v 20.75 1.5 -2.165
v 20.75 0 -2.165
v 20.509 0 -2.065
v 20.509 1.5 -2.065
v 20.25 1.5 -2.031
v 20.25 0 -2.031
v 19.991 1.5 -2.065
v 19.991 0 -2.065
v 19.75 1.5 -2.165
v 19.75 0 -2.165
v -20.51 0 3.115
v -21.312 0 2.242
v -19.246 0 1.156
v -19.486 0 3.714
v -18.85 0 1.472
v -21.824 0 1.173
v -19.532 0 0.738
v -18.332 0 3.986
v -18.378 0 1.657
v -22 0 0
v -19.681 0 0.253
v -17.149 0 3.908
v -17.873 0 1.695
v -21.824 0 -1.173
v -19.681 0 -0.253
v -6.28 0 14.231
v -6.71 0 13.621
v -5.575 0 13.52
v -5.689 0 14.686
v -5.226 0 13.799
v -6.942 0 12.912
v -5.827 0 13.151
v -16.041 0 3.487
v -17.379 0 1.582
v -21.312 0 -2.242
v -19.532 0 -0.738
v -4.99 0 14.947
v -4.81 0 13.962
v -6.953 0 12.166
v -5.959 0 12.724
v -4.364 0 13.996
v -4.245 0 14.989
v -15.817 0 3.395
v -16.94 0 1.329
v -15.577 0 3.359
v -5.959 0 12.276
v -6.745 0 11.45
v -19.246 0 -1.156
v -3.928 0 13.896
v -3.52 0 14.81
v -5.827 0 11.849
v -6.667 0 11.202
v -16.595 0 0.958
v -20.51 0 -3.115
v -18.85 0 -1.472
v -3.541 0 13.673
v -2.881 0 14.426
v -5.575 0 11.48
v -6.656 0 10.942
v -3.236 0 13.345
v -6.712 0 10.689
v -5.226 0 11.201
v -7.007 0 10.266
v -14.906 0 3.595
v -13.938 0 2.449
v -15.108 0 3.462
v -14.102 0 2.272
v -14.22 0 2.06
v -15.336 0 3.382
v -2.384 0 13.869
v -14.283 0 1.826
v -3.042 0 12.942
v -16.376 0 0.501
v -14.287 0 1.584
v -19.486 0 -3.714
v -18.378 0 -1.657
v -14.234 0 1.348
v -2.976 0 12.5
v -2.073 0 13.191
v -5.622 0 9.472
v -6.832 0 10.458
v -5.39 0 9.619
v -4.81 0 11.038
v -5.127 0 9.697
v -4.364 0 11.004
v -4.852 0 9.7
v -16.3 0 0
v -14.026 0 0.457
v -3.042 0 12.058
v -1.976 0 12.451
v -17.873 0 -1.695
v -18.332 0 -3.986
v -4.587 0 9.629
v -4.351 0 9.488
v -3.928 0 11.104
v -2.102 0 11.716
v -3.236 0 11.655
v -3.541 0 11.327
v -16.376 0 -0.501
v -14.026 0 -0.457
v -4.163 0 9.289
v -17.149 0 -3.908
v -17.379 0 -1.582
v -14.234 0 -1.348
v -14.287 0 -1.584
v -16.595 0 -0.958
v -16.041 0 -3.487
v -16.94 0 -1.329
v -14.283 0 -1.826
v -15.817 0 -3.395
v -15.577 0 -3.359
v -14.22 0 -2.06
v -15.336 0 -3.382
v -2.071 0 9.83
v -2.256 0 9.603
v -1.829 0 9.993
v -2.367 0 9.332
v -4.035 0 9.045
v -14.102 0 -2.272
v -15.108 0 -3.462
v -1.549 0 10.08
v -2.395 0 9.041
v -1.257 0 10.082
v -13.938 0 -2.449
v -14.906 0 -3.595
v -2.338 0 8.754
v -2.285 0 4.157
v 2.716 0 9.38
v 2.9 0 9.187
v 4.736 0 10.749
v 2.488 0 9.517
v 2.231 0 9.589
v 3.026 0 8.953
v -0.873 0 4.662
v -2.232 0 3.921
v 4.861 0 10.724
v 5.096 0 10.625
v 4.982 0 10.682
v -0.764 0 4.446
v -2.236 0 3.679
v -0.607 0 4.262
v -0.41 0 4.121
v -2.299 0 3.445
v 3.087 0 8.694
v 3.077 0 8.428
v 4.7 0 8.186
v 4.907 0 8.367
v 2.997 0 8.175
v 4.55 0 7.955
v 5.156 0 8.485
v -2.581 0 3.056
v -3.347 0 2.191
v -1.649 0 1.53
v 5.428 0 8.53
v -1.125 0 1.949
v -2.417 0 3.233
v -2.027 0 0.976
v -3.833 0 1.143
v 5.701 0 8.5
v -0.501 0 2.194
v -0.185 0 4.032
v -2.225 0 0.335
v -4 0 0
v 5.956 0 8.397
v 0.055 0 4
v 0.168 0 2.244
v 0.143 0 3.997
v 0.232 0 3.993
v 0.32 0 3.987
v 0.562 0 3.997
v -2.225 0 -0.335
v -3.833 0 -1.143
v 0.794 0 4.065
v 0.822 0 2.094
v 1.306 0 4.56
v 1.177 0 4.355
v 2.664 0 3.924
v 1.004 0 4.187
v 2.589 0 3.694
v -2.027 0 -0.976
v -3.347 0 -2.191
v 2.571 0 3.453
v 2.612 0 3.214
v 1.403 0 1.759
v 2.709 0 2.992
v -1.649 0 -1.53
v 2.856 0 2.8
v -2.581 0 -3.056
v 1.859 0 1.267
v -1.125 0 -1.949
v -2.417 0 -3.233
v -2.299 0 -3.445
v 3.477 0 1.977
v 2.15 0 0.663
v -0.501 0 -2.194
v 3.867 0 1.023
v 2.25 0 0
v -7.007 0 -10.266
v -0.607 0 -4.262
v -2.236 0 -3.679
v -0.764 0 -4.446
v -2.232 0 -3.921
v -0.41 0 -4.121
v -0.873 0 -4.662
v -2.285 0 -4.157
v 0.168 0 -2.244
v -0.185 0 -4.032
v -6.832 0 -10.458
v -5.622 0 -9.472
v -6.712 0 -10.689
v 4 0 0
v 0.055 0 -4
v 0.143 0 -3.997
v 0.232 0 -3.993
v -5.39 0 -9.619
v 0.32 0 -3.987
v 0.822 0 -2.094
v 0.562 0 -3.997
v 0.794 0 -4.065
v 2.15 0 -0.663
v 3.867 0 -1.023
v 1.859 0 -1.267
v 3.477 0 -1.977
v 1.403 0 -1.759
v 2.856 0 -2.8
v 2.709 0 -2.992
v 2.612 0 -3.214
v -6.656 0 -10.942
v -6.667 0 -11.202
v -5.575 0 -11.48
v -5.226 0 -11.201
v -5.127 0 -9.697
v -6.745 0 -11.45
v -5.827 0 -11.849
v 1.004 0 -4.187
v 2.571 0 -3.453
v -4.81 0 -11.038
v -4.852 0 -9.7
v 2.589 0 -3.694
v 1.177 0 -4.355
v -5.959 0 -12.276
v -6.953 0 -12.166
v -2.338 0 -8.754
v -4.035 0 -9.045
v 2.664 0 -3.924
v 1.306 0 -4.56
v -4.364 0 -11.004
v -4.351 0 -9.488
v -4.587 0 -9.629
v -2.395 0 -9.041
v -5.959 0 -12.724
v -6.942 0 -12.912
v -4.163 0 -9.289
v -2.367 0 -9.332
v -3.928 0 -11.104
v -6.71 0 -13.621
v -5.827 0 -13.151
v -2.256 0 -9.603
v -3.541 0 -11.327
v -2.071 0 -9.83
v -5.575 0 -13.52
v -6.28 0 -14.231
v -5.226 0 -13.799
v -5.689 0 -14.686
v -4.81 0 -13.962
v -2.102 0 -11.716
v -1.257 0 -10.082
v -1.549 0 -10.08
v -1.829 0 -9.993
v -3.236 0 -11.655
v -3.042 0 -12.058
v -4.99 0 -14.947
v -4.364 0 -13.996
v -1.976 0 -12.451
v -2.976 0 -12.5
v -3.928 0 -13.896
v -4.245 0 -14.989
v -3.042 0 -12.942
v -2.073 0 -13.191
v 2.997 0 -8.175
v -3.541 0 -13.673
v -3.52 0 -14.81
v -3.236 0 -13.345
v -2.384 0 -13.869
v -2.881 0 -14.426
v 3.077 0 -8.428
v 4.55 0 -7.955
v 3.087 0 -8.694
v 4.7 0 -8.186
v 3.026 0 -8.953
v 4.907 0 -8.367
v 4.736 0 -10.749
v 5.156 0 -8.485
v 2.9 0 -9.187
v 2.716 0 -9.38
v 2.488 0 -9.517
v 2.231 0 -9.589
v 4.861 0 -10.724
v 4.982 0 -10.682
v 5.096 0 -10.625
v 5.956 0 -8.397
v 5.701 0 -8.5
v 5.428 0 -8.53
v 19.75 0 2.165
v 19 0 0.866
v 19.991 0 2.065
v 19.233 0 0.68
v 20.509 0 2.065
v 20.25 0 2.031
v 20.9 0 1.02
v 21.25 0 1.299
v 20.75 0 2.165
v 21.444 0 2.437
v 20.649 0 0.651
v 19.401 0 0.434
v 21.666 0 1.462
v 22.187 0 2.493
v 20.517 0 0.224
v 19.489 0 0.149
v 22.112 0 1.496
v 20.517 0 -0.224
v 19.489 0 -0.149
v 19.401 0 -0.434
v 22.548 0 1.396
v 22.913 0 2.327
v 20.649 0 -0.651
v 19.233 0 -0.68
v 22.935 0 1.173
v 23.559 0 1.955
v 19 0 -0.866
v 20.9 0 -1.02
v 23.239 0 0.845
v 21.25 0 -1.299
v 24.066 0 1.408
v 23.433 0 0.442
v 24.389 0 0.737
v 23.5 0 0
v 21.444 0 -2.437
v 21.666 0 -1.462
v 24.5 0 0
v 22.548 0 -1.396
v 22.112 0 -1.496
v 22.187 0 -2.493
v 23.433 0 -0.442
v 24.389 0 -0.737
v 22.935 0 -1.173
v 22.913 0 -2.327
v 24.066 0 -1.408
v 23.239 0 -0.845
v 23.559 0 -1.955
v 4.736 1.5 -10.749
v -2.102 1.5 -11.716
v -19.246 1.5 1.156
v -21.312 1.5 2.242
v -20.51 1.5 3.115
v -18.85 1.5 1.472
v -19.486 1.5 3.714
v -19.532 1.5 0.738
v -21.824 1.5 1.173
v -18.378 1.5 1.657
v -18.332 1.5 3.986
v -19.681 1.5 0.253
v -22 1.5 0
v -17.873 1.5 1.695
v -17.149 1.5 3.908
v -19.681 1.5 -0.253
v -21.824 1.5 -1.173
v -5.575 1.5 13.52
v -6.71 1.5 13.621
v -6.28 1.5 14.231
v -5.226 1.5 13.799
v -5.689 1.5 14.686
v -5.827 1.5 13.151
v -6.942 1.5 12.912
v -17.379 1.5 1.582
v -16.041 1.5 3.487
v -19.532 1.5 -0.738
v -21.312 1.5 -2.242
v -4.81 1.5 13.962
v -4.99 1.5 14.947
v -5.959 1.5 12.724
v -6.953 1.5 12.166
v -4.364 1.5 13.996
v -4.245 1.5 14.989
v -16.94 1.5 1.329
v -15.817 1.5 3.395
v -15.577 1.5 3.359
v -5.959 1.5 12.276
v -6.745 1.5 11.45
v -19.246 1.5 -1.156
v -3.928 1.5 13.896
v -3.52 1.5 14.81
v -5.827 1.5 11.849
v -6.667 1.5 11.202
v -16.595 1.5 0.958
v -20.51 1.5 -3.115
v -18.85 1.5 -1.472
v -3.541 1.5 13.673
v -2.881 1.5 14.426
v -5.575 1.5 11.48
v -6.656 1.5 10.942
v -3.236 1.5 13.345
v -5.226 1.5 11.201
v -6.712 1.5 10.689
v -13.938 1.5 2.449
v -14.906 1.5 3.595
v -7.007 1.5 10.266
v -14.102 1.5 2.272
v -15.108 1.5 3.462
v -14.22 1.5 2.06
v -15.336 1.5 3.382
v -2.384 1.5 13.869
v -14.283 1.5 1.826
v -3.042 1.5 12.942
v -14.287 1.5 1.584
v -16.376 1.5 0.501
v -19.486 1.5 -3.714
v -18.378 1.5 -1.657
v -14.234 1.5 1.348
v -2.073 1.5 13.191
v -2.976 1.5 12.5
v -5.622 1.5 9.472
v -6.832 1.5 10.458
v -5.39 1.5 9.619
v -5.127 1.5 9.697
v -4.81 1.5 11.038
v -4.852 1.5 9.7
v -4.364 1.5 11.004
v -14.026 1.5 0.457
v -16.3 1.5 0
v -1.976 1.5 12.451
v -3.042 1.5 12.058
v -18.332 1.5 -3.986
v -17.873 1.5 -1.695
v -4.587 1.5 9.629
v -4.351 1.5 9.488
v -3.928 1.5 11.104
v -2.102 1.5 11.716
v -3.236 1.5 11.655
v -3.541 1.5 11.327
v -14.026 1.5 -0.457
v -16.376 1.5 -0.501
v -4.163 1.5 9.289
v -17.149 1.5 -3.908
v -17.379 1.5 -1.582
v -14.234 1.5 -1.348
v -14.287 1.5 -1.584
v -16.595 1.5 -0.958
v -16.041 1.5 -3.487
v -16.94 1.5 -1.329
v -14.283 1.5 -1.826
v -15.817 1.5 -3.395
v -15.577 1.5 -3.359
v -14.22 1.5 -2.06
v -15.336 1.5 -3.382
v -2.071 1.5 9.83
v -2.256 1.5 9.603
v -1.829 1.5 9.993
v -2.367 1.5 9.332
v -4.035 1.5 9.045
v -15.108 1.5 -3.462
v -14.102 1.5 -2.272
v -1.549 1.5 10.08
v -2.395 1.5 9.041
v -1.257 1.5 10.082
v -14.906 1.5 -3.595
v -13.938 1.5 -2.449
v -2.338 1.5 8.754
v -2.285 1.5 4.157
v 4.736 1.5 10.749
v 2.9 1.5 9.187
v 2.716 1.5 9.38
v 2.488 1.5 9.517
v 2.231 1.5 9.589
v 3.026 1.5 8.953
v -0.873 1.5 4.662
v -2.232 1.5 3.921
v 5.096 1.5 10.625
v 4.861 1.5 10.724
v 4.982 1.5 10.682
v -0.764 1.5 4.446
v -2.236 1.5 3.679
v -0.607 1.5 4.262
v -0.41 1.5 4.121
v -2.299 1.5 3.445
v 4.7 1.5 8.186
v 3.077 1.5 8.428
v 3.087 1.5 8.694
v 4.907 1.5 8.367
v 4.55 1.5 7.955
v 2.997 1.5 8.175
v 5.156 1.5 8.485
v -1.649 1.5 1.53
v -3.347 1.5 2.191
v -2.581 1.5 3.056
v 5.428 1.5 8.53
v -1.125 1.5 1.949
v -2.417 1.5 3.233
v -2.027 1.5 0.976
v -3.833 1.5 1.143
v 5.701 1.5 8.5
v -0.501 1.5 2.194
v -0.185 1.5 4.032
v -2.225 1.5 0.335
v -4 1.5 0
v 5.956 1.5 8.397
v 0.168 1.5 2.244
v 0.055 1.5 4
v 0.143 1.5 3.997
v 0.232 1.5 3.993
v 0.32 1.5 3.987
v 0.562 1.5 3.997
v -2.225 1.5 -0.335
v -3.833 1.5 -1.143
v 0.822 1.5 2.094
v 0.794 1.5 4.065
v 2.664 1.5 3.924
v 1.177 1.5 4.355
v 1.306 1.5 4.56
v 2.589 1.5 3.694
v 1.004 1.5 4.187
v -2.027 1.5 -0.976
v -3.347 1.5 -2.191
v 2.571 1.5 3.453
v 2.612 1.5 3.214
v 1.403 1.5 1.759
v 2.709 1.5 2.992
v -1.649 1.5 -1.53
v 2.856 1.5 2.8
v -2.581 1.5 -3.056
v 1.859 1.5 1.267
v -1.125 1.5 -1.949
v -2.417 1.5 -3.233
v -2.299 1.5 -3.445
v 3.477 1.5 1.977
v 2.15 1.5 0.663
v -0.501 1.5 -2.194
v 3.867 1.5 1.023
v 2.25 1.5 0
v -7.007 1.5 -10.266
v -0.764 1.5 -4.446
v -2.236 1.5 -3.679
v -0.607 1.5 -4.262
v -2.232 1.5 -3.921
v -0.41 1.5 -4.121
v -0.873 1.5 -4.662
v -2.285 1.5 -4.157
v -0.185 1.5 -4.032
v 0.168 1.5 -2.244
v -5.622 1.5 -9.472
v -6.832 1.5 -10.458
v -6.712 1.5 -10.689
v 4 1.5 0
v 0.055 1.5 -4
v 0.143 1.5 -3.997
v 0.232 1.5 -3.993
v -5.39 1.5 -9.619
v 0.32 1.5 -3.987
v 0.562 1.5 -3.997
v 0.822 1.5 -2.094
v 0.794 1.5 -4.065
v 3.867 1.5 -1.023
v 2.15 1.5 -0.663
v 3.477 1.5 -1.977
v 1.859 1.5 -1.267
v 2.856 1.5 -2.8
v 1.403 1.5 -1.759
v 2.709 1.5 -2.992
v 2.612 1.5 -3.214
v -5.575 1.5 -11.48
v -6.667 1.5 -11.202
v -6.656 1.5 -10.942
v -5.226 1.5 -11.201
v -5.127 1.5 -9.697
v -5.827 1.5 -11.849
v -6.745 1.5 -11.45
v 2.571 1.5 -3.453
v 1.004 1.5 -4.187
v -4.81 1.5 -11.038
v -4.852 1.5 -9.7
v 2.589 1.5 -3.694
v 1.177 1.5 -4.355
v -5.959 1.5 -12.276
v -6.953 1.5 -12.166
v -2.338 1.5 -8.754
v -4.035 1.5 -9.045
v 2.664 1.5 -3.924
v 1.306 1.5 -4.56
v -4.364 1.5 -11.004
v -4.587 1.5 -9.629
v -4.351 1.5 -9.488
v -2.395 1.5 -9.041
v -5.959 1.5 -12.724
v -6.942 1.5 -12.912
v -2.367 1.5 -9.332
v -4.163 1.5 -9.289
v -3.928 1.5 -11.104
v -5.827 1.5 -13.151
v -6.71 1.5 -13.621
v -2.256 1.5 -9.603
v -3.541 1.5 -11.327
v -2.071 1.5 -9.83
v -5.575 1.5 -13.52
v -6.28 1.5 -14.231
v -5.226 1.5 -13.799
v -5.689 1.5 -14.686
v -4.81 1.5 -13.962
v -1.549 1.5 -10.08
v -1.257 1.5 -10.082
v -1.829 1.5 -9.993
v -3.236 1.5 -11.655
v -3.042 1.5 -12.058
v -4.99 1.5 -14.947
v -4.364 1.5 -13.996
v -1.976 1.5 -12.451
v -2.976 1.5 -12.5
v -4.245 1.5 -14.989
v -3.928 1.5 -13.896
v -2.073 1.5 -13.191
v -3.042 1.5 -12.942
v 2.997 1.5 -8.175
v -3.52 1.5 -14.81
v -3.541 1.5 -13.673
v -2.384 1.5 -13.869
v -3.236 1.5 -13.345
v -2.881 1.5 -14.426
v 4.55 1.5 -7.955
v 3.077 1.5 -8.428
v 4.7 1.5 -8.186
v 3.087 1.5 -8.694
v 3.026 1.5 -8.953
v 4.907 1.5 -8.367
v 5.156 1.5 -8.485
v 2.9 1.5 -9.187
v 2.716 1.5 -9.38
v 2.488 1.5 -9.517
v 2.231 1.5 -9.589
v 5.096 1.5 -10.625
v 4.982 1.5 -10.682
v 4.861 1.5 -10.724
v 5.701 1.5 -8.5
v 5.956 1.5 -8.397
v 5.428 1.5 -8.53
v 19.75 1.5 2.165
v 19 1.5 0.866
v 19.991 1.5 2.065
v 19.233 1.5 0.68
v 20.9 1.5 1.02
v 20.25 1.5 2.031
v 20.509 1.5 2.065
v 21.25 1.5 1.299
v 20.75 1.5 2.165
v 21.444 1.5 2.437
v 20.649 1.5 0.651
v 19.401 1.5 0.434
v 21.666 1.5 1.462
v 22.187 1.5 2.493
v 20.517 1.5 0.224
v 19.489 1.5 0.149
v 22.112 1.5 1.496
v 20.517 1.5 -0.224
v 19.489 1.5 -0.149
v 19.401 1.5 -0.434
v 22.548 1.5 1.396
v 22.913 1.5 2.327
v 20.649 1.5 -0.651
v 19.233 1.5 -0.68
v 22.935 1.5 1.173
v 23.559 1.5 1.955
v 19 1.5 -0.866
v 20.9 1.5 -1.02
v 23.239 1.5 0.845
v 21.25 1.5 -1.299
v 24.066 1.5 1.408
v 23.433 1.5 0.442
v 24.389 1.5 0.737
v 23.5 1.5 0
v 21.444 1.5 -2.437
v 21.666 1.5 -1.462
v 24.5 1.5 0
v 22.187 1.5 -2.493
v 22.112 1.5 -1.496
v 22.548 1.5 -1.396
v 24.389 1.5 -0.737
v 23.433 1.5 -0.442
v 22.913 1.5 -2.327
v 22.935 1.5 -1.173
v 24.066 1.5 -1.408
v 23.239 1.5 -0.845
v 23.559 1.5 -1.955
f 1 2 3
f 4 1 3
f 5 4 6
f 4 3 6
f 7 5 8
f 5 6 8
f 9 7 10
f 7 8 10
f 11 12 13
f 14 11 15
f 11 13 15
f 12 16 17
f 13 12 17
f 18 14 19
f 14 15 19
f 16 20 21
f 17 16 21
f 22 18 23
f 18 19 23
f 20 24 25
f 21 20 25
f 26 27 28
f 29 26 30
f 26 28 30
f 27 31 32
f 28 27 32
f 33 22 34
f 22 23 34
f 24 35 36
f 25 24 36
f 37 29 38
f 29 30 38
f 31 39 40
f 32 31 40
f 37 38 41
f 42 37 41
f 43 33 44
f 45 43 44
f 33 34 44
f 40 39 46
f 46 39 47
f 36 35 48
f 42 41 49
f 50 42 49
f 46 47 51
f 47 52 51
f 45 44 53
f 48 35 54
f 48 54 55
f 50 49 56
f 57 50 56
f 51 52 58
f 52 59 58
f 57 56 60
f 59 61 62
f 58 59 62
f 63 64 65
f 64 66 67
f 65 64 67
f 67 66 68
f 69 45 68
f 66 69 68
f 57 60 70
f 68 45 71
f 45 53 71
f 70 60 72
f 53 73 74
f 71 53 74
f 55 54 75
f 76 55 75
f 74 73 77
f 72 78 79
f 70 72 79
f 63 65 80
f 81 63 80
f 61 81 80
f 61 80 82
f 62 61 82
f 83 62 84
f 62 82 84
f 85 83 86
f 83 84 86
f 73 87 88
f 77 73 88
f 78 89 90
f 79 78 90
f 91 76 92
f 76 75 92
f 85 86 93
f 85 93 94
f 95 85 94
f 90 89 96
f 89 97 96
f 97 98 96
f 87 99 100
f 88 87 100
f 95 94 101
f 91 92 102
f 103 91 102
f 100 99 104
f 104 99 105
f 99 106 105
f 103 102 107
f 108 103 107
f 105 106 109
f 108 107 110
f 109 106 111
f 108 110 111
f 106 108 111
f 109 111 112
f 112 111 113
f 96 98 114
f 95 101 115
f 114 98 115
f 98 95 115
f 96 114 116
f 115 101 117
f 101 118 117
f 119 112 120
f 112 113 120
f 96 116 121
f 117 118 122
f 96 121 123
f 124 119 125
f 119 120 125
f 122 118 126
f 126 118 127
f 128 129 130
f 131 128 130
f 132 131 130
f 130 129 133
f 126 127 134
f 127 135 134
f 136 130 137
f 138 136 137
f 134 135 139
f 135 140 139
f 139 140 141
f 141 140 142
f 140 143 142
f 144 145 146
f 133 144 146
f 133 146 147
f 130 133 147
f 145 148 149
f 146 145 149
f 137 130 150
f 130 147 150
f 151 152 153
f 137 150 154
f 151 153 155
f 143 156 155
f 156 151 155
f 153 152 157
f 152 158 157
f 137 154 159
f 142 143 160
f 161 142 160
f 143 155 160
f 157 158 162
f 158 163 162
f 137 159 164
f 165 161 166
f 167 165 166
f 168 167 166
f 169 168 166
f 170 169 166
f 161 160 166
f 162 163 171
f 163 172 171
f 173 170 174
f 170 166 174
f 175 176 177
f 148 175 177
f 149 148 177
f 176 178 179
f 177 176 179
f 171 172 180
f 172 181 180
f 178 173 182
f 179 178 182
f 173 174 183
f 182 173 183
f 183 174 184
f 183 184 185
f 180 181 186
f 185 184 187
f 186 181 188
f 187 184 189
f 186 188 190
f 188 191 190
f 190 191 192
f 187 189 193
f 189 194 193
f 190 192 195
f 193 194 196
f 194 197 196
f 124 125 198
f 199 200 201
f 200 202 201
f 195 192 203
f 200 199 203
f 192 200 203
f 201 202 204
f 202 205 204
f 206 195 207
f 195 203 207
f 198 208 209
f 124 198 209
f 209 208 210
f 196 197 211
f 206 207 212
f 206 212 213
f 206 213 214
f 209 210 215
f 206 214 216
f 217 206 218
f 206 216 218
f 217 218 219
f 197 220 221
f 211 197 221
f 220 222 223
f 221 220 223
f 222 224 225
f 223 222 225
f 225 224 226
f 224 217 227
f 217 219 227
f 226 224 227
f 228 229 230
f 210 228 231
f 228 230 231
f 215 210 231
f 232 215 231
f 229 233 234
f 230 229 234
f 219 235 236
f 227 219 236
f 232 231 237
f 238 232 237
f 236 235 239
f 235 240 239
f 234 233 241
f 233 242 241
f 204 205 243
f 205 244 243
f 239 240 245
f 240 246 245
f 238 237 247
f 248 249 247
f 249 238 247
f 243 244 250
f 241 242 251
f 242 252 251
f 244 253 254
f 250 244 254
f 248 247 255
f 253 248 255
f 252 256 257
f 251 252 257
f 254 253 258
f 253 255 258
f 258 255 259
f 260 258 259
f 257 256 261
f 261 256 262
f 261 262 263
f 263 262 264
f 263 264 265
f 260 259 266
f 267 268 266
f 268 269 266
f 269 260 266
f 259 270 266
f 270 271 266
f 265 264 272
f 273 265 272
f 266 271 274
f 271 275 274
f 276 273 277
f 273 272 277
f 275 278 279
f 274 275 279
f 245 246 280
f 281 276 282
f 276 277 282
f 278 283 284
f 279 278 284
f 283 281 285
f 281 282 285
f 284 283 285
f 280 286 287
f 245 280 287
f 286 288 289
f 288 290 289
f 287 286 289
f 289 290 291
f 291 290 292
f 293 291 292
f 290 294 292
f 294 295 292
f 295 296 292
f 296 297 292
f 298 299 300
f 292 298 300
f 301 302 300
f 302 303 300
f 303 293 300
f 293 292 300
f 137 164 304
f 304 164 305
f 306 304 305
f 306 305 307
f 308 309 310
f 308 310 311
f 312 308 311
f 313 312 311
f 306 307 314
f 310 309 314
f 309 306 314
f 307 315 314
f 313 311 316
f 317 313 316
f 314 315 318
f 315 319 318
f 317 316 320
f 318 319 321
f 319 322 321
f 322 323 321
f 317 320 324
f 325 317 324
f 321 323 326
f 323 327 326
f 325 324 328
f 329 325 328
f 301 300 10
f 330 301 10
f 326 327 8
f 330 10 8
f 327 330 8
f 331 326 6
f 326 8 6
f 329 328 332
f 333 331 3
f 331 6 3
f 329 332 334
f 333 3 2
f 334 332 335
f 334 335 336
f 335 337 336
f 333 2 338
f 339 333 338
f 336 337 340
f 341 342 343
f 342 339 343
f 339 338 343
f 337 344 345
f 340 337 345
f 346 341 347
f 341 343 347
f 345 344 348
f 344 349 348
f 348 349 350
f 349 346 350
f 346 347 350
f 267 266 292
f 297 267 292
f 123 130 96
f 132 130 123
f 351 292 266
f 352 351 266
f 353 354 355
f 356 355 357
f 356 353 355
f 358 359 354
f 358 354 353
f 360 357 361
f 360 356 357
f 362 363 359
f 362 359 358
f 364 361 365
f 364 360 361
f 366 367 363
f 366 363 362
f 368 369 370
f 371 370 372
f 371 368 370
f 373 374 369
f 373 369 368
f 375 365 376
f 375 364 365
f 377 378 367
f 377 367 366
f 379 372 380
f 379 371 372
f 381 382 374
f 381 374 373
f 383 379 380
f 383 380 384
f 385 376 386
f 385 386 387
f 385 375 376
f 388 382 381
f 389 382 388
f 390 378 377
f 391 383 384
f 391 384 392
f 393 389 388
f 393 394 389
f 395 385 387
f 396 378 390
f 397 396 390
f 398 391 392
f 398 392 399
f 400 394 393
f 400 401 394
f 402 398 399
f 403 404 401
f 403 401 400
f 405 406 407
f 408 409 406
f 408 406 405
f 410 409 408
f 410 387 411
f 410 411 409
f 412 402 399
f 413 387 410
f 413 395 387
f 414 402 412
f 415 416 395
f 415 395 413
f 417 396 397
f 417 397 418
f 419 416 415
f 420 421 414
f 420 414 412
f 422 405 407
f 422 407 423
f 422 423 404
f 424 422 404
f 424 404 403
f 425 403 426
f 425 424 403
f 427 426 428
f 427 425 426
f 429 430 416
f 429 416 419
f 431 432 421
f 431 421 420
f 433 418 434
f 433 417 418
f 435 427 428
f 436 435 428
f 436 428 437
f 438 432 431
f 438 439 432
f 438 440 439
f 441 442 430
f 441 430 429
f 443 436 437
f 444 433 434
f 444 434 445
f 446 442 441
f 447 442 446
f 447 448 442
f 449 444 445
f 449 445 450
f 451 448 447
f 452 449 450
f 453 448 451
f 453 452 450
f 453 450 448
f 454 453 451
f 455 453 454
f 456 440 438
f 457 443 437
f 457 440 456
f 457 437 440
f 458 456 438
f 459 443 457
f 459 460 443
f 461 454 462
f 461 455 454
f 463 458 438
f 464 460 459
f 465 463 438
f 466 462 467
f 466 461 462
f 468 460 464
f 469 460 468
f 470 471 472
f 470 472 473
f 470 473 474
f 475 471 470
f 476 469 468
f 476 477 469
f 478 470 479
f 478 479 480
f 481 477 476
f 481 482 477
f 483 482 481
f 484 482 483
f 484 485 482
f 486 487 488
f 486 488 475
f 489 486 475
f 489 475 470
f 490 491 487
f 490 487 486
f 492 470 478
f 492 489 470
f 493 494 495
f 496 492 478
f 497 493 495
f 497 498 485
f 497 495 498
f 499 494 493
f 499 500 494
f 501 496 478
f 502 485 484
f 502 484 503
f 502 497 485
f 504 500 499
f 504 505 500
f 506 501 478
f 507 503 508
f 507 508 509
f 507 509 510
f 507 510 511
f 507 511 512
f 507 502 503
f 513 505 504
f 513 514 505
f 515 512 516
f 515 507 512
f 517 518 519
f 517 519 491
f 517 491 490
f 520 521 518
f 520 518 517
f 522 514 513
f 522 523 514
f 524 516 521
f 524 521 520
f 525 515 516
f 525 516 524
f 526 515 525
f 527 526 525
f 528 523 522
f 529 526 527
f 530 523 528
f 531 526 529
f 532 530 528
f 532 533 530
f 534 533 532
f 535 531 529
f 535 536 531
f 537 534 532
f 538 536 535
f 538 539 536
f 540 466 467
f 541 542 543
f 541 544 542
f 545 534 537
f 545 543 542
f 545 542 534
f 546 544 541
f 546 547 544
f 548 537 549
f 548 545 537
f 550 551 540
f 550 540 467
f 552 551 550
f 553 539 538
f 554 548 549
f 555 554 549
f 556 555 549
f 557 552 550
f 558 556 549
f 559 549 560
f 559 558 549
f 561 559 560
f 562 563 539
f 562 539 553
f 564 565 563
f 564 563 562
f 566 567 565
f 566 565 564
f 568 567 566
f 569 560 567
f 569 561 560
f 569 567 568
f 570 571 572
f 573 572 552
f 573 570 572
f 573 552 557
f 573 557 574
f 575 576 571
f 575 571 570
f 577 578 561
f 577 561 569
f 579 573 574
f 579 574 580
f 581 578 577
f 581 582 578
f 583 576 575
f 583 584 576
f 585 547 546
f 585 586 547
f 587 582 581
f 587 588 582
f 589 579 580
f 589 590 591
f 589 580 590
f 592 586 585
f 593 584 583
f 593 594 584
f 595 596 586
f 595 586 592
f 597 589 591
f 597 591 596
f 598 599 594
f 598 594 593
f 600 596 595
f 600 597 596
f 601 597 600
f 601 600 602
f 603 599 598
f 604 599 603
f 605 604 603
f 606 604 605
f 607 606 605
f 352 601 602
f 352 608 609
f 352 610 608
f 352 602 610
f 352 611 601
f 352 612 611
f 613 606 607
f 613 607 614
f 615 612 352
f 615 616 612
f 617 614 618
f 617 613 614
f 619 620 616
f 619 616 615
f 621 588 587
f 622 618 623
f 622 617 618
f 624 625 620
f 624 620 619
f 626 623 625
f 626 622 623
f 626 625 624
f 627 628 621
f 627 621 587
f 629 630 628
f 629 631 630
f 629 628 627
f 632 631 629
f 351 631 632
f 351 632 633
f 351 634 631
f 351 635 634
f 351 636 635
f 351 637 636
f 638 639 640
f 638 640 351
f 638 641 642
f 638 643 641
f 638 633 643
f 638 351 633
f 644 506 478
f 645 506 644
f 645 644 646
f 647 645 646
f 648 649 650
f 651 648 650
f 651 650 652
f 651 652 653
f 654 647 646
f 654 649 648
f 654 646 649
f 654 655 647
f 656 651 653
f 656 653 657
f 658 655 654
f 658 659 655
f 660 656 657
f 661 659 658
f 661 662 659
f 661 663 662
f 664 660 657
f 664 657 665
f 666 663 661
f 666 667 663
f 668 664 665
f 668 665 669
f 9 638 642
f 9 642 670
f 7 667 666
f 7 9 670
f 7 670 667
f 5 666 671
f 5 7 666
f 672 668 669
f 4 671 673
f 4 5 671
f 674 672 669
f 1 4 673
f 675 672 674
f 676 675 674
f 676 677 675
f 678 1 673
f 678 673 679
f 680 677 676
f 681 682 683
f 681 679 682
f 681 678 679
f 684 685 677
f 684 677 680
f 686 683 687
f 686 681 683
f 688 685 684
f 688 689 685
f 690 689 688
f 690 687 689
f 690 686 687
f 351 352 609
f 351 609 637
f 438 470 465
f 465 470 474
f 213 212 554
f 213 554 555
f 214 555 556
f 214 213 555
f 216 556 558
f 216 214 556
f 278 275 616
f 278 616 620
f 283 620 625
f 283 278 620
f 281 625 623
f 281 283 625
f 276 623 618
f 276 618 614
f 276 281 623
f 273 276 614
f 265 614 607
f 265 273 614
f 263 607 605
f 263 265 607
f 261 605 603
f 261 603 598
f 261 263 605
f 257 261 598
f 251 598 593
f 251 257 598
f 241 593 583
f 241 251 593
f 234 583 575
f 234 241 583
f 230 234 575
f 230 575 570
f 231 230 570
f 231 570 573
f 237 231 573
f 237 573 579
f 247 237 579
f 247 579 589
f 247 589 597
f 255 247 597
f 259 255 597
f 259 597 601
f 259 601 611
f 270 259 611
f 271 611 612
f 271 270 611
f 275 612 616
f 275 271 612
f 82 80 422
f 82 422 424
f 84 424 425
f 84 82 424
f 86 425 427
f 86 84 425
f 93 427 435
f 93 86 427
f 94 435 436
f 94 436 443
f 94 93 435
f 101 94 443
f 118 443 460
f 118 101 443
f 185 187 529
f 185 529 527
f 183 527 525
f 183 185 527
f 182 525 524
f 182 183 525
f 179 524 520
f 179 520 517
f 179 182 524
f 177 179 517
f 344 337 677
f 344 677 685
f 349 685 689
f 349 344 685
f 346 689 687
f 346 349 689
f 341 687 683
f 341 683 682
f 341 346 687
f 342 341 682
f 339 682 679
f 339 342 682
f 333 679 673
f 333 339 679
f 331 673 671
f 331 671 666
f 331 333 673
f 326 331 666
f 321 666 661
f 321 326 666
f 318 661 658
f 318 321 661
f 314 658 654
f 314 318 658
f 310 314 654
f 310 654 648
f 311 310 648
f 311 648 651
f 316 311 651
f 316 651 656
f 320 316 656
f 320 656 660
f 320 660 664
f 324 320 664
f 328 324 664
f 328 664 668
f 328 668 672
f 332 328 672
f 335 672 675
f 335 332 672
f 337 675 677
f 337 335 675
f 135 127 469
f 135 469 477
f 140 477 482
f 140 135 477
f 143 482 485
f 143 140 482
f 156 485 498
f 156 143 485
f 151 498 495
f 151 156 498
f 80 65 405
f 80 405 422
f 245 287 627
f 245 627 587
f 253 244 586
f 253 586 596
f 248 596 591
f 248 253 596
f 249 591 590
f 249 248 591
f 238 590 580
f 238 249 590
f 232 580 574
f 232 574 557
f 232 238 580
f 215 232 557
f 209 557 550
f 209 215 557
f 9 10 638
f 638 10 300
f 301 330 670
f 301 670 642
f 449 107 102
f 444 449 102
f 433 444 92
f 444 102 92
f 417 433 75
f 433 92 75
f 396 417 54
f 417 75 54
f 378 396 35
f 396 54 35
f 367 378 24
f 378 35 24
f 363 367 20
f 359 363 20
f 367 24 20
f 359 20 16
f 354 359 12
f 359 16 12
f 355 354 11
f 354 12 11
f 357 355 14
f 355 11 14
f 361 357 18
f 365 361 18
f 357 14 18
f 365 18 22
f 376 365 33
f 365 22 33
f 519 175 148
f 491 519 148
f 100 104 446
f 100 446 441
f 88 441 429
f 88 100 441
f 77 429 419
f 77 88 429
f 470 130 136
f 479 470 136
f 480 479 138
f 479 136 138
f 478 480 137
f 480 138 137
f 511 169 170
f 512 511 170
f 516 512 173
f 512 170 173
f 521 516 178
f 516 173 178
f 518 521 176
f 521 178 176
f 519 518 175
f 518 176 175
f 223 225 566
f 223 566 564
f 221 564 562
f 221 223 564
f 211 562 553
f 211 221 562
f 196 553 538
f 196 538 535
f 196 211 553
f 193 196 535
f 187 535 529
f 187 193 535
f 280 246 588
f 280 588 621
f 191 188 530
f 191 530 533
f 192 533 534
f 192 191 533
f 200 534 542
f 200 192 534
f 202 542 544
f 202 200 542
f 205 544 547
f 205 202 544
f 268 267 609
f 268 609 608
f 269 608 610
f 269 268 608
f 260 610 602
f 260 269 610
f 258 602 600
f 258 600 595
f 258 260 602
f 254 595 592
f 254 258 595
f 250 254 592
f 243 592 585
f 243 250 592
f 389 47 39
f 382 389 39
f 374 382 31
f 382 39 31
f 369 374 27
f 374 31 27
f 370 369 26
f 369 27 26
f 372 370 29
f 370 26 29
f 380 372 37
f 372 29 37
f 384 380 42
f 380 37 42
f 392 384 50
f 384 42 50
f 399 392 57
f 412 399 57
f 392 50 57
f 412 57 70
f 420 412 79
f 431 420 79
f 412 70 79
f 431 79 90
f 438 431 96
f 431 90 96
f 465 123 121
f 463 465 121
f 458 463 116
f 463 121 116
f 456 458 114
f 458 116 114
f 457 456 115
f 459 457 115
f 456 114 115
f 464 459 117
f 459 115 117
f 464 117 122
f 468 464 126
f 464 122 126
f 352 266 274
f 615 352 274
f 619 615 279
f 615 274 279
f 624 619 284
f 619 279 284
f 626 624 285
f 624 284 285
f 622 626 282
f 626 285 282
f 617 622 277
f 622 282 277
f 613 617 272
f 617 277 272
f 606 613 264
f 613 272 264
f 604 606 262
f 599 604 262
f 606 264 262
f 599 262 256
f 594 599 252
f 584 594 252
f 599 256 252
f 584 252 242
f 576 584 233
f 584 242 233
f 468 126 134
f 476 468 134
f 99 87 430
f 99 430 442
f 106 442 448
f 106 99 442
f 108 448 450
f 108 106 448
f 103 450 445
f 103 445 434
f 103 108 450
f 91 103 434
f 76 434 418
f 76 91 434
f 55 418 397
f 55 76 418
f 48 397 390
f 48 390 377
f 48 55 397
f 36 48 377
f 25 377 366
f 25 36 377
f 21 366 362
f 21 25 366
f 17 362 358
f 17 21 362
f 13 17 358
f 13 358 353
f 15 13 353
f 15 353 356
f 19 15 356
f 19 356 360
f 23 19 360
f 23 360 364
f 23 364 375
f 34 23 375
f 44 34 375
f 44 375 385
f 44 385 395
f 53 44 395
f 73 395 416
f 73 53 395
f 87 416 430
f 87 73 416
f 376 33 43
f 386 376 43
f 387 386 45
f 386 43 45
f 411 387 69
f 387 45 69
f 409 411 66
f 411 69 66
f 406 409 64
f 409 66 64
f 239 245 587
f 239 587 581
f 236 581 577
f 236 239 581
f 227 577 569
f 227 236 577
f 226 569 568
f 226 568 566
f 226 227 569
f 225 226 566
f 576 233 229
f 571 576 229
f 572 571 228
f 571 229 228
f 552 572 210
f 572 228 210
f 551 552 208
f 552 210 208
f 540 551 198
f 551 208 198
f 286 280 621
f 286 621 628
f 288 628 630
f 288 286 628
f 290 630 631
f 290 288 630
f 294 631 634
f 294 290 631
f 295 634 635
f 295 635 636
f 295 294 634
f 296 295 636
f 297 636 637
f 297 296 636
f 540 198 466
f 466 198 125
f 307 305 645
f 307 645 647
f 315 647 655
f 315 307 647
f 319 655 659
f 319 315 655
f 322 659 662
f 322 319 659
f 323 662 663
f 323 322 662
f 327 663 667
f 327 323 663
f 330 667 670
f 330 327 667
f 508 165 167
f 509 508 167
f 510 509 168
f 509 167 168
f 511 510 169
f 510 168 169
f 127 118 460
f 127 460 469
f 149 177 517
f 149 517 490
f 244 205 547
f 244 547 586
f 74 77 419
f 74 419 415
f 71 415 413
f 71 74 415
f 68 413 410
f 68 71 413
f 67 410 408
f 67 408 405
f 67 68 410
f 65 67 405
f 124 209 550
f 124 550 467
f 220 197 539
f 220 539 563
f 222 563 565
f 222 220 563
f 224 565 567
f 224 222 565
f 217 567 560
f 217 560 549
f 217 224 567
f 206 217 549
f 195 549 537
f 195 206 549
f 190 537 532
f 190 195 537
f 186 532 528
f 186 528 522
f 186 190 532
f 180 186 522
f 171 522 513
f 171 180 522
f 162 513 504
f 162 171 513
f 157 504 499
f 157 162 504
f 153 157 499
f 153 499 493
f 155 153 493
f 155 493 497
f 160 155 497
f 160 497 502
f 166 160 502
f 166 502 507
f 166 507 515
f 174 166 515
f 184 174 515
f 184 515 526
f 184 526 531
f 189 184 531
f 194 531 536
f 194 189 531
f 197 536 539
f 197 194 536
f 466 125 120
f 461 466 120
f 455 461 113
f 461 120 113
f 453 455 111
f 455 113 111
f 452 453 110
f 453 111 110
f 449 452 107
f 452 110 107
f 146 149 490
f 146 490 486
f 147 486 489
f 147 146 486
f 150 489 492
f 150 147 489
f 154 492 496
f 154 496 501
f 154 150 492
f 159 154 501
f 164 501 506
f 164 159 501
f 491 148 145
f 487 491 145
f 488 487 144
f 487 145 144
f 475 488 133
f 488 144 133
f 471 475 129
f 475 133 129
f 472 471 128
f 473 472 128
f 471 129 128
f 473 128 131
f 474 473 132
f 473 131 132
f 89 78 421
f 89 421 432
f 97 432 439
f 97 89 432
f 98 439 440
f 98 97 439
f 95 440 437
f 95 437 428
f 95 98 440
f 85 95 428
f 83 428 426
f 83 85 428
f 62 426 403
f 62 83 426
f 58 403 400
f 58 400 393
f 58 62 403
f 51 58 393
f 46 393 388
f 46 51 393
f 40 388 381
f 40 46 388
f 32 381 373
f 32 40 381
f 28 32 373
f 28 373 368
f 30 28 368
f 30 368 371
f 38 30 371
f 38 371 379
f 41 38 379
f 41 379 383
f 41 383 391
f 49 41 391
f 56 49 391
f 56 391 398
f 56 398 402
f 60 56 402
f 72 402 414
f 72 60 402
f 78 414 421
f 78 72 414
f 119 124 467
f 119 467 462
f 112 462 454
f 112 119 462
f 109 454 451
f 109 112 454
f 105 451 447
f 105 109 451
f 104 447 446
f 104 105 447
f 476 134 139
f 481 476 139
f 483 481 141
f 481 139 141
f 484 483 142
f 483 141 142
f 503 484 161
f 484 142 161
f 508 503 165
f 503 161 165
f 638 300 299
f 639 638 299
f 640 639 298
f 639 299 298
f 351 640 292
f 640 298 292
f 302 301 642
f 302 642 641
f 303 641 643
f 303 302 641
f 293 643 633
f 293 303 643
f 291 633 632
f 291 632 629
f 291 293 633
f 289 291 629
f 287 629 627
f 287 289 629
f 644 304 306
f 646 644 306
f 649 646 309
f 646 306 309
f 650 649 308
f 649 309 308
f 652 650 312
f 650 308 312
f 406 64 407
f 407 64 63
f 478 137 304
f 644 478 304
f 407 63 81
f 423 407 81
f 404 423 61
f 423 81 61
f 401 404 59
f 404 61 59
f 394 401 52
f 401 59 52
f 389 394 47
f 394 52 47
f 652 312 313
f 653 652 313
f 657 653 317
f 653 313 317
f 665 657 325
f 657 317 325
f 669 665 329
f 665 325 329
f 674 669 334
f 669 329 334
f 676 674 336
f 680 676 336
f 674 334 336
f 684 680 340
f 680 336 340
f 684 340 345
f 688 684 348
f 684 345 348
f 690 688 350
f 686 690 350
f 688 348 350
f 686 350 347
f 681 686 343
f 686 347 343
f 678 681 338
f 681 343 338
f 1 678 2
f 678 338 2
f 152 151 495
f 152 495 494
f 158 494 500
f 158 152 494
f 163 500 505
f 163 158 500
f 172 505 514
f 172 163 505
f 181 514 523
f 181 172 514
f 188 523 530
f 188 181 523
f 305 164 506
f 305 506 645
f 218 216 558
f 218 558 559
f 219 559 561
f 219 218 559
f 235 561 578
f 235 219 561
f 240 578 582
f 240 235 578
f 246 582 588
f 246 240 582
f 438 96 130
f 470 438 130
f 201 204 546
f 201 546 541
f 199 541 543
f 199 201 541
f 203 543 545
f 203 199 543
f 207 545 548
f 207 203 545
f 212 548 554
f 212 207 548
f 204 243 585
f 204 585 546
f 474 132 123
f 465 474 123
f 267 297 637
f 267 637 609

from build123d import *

# Parameters (mm, degrees)
SKETCH_1_R      = 2.25
SKETCH_1_R_2    = 1.7
SKETCH_1_R_3    = 1.5
EXTRUDE_1_DEPTH = 1.5


with BuildPart() as part:
    # 草图1 → 凸台-拉伸1 (new body)
    with BuildSketch(Plane(origin=(0, 0, 0), x_dir=(1, 0, 0), z_dir=(0, 1, 0))):
        with BuildLine():
            Line((19.75, 2.165063509), (5.096488448, 10.625272348))
            ThreePointArc((5.096488448, 10.625272348), (4.922427124, 10.704637858), (4.736437674, 10.749405626))
            Line((4.736437674, 10.749405626), (-2.101908222, 11.7159388))
            ThreePointArc((-2.101908222, 11.7159388), (-4.61878361, 14.995906411), (-6.744553684, 11.449929699))
            ThreePointArc((-6.744553684, 11.449929699), (-6.675732942, 10.813623622), (-7.006838923, 10.265909693))
            Line((-7.006838923, 10.265909693), (-14.905573539, 3.595069524))
            ThreePointArc((-14.905573539, 3.595069524), (-15.456234647, 3.363542696), (-16.040639512, 3.487249128))
            ThreePointArc((-16.040639512, 3.487249128), (-22, 0), (-16.040639512, -3.487249128))
            ThreePointArc((-16.040639512, -3.487249128), (-15.456234647, -3.363542696), (-14.905573539, -3.595069524))
            Line((-14.905573539, -3.595069524), (-7.006838923, -10.265909693))
            ThreePointArc((-7.006838923, -10.265909693), (-6.675732942, -10.813623622), (-6.744553684, -11.449929699))
            ThreePointArc((-6.744553684, -11.449929699), (-4.61878361, -14.995906411), (-2.101908222, -11.7159388))
            Line((-2.101908222, -11.7159388), (4.736437674, -10.749405626))
            ThreePointArc((4.736437674, -10.749405626), (4.922427124, -10.704637858), (5.096488448, -10.625272348))
            Line((5.096488448, -10.625272348), (19.75, -2.165063509))
            ThreePointArc((19.75, -2.165063509), (20.25, -2.031088913), (20.75, -2.165063509))
            ThreePointArc((20.75, -2.165063509), (24.5, 0), (20.75, 2.165063509))
            ThreePointArc((20.75, 2.165063509), (20.25, 2.031088913), (19.75, 2.165063509))
        make_face()
        Circle(SKETCH_1_R, mode=Mode.SUBTRACT)
        with Locations((-18, 0)):
            Circle(SKETCH_1_R_2, mode=Mode.SUBTRACT)
        with Locations((22, 0)):
            Circle(SKETCH_1_R_3, mode=Mode.SUBTRACT)
        with Locations((-4.47577596, 12.5)):
            Circle(SKETCH_1_R_3, mode=Mode.SUBTRACT)
        with Locations((-4.47577596, -12.5)):
            Circle(SKETCH_1_R_3, mode=Mode.SUBTRACT)
        with BuildLine():
            Line((2.23143448, 9.588554578), (-1.256530939, 10.081544307))
            ThreePointArc((-1.256530939, 10.081544307), (-2.171731289, 9.72303877), (-2.33794765, 8.754281823))
            Line((-2.33794765, 8.754281823), (-0.872808817, 4.662424773))
            ThreePointArc((-0.872808817, 4.662424773), (-0.512657064, 4.185850496), (0.054926934, 3.999622861))
            ThreePointArc((0.054926934, 3.999622861), (0.187612888, 3.995597753), (0.320092213, 3.987172052))
            ThreePointArc((0.320092213, 3.987172052), (0.902629068, 4.119395878), (1.305852753, 4.56012594))
            Line((1.305852753, 4.56012594), (2.997222742, 8.174556771))
            ThreePointArc((2.997222742, 8.174556771), (2.970810351, 9.074617878), (2.23143448, 9.588554578))
        make_face(mode=Mode.SUBTRACT)
        with BuildLine():
            Line((19, 0.866025404), (5.956182941, 8.396876694))
            ThreePointArc((5.956182941, 8.396876694), (5.156119776, 8.484770625), (4.550445454, 7.954690416))
            Line((4.550445454, 7.954690416), (2.664458984, 3.924367251))
            ThreePointArc((2.664458984, 3.924367251), (2.584431714, 3.332397688), (2.856157177, 2.800422501))
            ThreePointArc((2.856157177, 2.800422501), (4, 0), (2.856157177, -2.800422501))
            ThreePointArc((2.856157177, -2.800422501), (2.584431714, -3.332397688), (2.664458984, -3.924367251))
            Line((2.664458984, -3.924367251), (4.550445454, -7.954690416))
            ThreePointArc((4.550445454, -7.954690416), (5.156119776, -8.484770625), (5.956182941, -8.396876694))
            Line((5.956182941, -8.396876694), (19, -0.866025404))
            ThreePointArc((19, -0.866025404), (19.5, 0), (19, 0.866025404))
        make_face(mode=Mode.SUBTRACT)
        with BuildLine():
            Line((-2.33794765, -8.754281823), (-0.872808817, -4.662424773))
            ThreePointArc((-0.872808817, -4.662424773), (-0.512657064, -4.185850496), (0.054926934, -3.999622861))
            ThreePointArc((0.054926934, -3.999622861), (0.187612888, -3.995597753), (0.320092213, -3.987172052))
            ThreePointArc((0.320092213, -3.987172052), (0.902629068, -4.119395878), (1.305852753, -4.56012594))
            Line((1.305852753, -4.56012594), (2.997222742, -8.174556771))
            ThreePointArc((2.997222742, -8.174556771), (2.970810351, -9.074617878), (2.23143448, -9.588554578))
            Line((2.23143448, -9.588554578), (-1.256530939, -10.081544307))
            ThreePointArc((-1.256530939, -10.081544307), (-2.171731289, -9.72303877), (-2.33794765, -8.754281823))
        make_face(mode=Mode.SUBTRACT)
        with BuildLine():
            Line((-5.622052564, 9.472053038), (-13.937734763, 2.449081695))
            ThreePointArc((-13.937734763, 2.449081695), (-14.258158429, 1.944937864), (-14.23400713, 1.348071847))
            ThreePointArc((-14.23400713, 1.348071847), (-14, 0), (-14.23400713, -1.348071847))
            ThreePointArc((-14.23400713, -1.348071847), (-14.258158429, -1.944937864), (-13.937734763, -2.449081695))
            Line((-13.937734763, -2.449081695), (-5.622052564, -9.472053038))
            ThreePointArc((-5.622052564, -9.472053038), (-4.717022681, -9.673722513), (-4.035359228, -9.045164955))
            Line((-4.035359228, -9.045164955), (-2.285010045, -4.156769069))
            ThreePointArc((-2.285010045, -4.156769069), (-2.260804326, -3.559905256), (-2.581182025, -3.055732213))
            ThreePointArc((-2.581182025, -3.055732213), (-4, 0), (-2.581182025, 3.055732213))
            ThreePointArc((-2.581182025, 3.055732213), (-2.260804326, 3.559905256), (-2.285010045, 4.156769069))
            Line((-2.285010045, 4.156769069), (-4.035359228, 9.045164955))
            ThreePointArc((-4.035359228, 9.045164955), (-4.717022681, 9.673722513), (-5.622052564, 9.472053038))
        make_face(mode=Mode.SUBTRACT)
    extrude(amount=EXTRUDE_1_DEPTH)


solid = part.part
